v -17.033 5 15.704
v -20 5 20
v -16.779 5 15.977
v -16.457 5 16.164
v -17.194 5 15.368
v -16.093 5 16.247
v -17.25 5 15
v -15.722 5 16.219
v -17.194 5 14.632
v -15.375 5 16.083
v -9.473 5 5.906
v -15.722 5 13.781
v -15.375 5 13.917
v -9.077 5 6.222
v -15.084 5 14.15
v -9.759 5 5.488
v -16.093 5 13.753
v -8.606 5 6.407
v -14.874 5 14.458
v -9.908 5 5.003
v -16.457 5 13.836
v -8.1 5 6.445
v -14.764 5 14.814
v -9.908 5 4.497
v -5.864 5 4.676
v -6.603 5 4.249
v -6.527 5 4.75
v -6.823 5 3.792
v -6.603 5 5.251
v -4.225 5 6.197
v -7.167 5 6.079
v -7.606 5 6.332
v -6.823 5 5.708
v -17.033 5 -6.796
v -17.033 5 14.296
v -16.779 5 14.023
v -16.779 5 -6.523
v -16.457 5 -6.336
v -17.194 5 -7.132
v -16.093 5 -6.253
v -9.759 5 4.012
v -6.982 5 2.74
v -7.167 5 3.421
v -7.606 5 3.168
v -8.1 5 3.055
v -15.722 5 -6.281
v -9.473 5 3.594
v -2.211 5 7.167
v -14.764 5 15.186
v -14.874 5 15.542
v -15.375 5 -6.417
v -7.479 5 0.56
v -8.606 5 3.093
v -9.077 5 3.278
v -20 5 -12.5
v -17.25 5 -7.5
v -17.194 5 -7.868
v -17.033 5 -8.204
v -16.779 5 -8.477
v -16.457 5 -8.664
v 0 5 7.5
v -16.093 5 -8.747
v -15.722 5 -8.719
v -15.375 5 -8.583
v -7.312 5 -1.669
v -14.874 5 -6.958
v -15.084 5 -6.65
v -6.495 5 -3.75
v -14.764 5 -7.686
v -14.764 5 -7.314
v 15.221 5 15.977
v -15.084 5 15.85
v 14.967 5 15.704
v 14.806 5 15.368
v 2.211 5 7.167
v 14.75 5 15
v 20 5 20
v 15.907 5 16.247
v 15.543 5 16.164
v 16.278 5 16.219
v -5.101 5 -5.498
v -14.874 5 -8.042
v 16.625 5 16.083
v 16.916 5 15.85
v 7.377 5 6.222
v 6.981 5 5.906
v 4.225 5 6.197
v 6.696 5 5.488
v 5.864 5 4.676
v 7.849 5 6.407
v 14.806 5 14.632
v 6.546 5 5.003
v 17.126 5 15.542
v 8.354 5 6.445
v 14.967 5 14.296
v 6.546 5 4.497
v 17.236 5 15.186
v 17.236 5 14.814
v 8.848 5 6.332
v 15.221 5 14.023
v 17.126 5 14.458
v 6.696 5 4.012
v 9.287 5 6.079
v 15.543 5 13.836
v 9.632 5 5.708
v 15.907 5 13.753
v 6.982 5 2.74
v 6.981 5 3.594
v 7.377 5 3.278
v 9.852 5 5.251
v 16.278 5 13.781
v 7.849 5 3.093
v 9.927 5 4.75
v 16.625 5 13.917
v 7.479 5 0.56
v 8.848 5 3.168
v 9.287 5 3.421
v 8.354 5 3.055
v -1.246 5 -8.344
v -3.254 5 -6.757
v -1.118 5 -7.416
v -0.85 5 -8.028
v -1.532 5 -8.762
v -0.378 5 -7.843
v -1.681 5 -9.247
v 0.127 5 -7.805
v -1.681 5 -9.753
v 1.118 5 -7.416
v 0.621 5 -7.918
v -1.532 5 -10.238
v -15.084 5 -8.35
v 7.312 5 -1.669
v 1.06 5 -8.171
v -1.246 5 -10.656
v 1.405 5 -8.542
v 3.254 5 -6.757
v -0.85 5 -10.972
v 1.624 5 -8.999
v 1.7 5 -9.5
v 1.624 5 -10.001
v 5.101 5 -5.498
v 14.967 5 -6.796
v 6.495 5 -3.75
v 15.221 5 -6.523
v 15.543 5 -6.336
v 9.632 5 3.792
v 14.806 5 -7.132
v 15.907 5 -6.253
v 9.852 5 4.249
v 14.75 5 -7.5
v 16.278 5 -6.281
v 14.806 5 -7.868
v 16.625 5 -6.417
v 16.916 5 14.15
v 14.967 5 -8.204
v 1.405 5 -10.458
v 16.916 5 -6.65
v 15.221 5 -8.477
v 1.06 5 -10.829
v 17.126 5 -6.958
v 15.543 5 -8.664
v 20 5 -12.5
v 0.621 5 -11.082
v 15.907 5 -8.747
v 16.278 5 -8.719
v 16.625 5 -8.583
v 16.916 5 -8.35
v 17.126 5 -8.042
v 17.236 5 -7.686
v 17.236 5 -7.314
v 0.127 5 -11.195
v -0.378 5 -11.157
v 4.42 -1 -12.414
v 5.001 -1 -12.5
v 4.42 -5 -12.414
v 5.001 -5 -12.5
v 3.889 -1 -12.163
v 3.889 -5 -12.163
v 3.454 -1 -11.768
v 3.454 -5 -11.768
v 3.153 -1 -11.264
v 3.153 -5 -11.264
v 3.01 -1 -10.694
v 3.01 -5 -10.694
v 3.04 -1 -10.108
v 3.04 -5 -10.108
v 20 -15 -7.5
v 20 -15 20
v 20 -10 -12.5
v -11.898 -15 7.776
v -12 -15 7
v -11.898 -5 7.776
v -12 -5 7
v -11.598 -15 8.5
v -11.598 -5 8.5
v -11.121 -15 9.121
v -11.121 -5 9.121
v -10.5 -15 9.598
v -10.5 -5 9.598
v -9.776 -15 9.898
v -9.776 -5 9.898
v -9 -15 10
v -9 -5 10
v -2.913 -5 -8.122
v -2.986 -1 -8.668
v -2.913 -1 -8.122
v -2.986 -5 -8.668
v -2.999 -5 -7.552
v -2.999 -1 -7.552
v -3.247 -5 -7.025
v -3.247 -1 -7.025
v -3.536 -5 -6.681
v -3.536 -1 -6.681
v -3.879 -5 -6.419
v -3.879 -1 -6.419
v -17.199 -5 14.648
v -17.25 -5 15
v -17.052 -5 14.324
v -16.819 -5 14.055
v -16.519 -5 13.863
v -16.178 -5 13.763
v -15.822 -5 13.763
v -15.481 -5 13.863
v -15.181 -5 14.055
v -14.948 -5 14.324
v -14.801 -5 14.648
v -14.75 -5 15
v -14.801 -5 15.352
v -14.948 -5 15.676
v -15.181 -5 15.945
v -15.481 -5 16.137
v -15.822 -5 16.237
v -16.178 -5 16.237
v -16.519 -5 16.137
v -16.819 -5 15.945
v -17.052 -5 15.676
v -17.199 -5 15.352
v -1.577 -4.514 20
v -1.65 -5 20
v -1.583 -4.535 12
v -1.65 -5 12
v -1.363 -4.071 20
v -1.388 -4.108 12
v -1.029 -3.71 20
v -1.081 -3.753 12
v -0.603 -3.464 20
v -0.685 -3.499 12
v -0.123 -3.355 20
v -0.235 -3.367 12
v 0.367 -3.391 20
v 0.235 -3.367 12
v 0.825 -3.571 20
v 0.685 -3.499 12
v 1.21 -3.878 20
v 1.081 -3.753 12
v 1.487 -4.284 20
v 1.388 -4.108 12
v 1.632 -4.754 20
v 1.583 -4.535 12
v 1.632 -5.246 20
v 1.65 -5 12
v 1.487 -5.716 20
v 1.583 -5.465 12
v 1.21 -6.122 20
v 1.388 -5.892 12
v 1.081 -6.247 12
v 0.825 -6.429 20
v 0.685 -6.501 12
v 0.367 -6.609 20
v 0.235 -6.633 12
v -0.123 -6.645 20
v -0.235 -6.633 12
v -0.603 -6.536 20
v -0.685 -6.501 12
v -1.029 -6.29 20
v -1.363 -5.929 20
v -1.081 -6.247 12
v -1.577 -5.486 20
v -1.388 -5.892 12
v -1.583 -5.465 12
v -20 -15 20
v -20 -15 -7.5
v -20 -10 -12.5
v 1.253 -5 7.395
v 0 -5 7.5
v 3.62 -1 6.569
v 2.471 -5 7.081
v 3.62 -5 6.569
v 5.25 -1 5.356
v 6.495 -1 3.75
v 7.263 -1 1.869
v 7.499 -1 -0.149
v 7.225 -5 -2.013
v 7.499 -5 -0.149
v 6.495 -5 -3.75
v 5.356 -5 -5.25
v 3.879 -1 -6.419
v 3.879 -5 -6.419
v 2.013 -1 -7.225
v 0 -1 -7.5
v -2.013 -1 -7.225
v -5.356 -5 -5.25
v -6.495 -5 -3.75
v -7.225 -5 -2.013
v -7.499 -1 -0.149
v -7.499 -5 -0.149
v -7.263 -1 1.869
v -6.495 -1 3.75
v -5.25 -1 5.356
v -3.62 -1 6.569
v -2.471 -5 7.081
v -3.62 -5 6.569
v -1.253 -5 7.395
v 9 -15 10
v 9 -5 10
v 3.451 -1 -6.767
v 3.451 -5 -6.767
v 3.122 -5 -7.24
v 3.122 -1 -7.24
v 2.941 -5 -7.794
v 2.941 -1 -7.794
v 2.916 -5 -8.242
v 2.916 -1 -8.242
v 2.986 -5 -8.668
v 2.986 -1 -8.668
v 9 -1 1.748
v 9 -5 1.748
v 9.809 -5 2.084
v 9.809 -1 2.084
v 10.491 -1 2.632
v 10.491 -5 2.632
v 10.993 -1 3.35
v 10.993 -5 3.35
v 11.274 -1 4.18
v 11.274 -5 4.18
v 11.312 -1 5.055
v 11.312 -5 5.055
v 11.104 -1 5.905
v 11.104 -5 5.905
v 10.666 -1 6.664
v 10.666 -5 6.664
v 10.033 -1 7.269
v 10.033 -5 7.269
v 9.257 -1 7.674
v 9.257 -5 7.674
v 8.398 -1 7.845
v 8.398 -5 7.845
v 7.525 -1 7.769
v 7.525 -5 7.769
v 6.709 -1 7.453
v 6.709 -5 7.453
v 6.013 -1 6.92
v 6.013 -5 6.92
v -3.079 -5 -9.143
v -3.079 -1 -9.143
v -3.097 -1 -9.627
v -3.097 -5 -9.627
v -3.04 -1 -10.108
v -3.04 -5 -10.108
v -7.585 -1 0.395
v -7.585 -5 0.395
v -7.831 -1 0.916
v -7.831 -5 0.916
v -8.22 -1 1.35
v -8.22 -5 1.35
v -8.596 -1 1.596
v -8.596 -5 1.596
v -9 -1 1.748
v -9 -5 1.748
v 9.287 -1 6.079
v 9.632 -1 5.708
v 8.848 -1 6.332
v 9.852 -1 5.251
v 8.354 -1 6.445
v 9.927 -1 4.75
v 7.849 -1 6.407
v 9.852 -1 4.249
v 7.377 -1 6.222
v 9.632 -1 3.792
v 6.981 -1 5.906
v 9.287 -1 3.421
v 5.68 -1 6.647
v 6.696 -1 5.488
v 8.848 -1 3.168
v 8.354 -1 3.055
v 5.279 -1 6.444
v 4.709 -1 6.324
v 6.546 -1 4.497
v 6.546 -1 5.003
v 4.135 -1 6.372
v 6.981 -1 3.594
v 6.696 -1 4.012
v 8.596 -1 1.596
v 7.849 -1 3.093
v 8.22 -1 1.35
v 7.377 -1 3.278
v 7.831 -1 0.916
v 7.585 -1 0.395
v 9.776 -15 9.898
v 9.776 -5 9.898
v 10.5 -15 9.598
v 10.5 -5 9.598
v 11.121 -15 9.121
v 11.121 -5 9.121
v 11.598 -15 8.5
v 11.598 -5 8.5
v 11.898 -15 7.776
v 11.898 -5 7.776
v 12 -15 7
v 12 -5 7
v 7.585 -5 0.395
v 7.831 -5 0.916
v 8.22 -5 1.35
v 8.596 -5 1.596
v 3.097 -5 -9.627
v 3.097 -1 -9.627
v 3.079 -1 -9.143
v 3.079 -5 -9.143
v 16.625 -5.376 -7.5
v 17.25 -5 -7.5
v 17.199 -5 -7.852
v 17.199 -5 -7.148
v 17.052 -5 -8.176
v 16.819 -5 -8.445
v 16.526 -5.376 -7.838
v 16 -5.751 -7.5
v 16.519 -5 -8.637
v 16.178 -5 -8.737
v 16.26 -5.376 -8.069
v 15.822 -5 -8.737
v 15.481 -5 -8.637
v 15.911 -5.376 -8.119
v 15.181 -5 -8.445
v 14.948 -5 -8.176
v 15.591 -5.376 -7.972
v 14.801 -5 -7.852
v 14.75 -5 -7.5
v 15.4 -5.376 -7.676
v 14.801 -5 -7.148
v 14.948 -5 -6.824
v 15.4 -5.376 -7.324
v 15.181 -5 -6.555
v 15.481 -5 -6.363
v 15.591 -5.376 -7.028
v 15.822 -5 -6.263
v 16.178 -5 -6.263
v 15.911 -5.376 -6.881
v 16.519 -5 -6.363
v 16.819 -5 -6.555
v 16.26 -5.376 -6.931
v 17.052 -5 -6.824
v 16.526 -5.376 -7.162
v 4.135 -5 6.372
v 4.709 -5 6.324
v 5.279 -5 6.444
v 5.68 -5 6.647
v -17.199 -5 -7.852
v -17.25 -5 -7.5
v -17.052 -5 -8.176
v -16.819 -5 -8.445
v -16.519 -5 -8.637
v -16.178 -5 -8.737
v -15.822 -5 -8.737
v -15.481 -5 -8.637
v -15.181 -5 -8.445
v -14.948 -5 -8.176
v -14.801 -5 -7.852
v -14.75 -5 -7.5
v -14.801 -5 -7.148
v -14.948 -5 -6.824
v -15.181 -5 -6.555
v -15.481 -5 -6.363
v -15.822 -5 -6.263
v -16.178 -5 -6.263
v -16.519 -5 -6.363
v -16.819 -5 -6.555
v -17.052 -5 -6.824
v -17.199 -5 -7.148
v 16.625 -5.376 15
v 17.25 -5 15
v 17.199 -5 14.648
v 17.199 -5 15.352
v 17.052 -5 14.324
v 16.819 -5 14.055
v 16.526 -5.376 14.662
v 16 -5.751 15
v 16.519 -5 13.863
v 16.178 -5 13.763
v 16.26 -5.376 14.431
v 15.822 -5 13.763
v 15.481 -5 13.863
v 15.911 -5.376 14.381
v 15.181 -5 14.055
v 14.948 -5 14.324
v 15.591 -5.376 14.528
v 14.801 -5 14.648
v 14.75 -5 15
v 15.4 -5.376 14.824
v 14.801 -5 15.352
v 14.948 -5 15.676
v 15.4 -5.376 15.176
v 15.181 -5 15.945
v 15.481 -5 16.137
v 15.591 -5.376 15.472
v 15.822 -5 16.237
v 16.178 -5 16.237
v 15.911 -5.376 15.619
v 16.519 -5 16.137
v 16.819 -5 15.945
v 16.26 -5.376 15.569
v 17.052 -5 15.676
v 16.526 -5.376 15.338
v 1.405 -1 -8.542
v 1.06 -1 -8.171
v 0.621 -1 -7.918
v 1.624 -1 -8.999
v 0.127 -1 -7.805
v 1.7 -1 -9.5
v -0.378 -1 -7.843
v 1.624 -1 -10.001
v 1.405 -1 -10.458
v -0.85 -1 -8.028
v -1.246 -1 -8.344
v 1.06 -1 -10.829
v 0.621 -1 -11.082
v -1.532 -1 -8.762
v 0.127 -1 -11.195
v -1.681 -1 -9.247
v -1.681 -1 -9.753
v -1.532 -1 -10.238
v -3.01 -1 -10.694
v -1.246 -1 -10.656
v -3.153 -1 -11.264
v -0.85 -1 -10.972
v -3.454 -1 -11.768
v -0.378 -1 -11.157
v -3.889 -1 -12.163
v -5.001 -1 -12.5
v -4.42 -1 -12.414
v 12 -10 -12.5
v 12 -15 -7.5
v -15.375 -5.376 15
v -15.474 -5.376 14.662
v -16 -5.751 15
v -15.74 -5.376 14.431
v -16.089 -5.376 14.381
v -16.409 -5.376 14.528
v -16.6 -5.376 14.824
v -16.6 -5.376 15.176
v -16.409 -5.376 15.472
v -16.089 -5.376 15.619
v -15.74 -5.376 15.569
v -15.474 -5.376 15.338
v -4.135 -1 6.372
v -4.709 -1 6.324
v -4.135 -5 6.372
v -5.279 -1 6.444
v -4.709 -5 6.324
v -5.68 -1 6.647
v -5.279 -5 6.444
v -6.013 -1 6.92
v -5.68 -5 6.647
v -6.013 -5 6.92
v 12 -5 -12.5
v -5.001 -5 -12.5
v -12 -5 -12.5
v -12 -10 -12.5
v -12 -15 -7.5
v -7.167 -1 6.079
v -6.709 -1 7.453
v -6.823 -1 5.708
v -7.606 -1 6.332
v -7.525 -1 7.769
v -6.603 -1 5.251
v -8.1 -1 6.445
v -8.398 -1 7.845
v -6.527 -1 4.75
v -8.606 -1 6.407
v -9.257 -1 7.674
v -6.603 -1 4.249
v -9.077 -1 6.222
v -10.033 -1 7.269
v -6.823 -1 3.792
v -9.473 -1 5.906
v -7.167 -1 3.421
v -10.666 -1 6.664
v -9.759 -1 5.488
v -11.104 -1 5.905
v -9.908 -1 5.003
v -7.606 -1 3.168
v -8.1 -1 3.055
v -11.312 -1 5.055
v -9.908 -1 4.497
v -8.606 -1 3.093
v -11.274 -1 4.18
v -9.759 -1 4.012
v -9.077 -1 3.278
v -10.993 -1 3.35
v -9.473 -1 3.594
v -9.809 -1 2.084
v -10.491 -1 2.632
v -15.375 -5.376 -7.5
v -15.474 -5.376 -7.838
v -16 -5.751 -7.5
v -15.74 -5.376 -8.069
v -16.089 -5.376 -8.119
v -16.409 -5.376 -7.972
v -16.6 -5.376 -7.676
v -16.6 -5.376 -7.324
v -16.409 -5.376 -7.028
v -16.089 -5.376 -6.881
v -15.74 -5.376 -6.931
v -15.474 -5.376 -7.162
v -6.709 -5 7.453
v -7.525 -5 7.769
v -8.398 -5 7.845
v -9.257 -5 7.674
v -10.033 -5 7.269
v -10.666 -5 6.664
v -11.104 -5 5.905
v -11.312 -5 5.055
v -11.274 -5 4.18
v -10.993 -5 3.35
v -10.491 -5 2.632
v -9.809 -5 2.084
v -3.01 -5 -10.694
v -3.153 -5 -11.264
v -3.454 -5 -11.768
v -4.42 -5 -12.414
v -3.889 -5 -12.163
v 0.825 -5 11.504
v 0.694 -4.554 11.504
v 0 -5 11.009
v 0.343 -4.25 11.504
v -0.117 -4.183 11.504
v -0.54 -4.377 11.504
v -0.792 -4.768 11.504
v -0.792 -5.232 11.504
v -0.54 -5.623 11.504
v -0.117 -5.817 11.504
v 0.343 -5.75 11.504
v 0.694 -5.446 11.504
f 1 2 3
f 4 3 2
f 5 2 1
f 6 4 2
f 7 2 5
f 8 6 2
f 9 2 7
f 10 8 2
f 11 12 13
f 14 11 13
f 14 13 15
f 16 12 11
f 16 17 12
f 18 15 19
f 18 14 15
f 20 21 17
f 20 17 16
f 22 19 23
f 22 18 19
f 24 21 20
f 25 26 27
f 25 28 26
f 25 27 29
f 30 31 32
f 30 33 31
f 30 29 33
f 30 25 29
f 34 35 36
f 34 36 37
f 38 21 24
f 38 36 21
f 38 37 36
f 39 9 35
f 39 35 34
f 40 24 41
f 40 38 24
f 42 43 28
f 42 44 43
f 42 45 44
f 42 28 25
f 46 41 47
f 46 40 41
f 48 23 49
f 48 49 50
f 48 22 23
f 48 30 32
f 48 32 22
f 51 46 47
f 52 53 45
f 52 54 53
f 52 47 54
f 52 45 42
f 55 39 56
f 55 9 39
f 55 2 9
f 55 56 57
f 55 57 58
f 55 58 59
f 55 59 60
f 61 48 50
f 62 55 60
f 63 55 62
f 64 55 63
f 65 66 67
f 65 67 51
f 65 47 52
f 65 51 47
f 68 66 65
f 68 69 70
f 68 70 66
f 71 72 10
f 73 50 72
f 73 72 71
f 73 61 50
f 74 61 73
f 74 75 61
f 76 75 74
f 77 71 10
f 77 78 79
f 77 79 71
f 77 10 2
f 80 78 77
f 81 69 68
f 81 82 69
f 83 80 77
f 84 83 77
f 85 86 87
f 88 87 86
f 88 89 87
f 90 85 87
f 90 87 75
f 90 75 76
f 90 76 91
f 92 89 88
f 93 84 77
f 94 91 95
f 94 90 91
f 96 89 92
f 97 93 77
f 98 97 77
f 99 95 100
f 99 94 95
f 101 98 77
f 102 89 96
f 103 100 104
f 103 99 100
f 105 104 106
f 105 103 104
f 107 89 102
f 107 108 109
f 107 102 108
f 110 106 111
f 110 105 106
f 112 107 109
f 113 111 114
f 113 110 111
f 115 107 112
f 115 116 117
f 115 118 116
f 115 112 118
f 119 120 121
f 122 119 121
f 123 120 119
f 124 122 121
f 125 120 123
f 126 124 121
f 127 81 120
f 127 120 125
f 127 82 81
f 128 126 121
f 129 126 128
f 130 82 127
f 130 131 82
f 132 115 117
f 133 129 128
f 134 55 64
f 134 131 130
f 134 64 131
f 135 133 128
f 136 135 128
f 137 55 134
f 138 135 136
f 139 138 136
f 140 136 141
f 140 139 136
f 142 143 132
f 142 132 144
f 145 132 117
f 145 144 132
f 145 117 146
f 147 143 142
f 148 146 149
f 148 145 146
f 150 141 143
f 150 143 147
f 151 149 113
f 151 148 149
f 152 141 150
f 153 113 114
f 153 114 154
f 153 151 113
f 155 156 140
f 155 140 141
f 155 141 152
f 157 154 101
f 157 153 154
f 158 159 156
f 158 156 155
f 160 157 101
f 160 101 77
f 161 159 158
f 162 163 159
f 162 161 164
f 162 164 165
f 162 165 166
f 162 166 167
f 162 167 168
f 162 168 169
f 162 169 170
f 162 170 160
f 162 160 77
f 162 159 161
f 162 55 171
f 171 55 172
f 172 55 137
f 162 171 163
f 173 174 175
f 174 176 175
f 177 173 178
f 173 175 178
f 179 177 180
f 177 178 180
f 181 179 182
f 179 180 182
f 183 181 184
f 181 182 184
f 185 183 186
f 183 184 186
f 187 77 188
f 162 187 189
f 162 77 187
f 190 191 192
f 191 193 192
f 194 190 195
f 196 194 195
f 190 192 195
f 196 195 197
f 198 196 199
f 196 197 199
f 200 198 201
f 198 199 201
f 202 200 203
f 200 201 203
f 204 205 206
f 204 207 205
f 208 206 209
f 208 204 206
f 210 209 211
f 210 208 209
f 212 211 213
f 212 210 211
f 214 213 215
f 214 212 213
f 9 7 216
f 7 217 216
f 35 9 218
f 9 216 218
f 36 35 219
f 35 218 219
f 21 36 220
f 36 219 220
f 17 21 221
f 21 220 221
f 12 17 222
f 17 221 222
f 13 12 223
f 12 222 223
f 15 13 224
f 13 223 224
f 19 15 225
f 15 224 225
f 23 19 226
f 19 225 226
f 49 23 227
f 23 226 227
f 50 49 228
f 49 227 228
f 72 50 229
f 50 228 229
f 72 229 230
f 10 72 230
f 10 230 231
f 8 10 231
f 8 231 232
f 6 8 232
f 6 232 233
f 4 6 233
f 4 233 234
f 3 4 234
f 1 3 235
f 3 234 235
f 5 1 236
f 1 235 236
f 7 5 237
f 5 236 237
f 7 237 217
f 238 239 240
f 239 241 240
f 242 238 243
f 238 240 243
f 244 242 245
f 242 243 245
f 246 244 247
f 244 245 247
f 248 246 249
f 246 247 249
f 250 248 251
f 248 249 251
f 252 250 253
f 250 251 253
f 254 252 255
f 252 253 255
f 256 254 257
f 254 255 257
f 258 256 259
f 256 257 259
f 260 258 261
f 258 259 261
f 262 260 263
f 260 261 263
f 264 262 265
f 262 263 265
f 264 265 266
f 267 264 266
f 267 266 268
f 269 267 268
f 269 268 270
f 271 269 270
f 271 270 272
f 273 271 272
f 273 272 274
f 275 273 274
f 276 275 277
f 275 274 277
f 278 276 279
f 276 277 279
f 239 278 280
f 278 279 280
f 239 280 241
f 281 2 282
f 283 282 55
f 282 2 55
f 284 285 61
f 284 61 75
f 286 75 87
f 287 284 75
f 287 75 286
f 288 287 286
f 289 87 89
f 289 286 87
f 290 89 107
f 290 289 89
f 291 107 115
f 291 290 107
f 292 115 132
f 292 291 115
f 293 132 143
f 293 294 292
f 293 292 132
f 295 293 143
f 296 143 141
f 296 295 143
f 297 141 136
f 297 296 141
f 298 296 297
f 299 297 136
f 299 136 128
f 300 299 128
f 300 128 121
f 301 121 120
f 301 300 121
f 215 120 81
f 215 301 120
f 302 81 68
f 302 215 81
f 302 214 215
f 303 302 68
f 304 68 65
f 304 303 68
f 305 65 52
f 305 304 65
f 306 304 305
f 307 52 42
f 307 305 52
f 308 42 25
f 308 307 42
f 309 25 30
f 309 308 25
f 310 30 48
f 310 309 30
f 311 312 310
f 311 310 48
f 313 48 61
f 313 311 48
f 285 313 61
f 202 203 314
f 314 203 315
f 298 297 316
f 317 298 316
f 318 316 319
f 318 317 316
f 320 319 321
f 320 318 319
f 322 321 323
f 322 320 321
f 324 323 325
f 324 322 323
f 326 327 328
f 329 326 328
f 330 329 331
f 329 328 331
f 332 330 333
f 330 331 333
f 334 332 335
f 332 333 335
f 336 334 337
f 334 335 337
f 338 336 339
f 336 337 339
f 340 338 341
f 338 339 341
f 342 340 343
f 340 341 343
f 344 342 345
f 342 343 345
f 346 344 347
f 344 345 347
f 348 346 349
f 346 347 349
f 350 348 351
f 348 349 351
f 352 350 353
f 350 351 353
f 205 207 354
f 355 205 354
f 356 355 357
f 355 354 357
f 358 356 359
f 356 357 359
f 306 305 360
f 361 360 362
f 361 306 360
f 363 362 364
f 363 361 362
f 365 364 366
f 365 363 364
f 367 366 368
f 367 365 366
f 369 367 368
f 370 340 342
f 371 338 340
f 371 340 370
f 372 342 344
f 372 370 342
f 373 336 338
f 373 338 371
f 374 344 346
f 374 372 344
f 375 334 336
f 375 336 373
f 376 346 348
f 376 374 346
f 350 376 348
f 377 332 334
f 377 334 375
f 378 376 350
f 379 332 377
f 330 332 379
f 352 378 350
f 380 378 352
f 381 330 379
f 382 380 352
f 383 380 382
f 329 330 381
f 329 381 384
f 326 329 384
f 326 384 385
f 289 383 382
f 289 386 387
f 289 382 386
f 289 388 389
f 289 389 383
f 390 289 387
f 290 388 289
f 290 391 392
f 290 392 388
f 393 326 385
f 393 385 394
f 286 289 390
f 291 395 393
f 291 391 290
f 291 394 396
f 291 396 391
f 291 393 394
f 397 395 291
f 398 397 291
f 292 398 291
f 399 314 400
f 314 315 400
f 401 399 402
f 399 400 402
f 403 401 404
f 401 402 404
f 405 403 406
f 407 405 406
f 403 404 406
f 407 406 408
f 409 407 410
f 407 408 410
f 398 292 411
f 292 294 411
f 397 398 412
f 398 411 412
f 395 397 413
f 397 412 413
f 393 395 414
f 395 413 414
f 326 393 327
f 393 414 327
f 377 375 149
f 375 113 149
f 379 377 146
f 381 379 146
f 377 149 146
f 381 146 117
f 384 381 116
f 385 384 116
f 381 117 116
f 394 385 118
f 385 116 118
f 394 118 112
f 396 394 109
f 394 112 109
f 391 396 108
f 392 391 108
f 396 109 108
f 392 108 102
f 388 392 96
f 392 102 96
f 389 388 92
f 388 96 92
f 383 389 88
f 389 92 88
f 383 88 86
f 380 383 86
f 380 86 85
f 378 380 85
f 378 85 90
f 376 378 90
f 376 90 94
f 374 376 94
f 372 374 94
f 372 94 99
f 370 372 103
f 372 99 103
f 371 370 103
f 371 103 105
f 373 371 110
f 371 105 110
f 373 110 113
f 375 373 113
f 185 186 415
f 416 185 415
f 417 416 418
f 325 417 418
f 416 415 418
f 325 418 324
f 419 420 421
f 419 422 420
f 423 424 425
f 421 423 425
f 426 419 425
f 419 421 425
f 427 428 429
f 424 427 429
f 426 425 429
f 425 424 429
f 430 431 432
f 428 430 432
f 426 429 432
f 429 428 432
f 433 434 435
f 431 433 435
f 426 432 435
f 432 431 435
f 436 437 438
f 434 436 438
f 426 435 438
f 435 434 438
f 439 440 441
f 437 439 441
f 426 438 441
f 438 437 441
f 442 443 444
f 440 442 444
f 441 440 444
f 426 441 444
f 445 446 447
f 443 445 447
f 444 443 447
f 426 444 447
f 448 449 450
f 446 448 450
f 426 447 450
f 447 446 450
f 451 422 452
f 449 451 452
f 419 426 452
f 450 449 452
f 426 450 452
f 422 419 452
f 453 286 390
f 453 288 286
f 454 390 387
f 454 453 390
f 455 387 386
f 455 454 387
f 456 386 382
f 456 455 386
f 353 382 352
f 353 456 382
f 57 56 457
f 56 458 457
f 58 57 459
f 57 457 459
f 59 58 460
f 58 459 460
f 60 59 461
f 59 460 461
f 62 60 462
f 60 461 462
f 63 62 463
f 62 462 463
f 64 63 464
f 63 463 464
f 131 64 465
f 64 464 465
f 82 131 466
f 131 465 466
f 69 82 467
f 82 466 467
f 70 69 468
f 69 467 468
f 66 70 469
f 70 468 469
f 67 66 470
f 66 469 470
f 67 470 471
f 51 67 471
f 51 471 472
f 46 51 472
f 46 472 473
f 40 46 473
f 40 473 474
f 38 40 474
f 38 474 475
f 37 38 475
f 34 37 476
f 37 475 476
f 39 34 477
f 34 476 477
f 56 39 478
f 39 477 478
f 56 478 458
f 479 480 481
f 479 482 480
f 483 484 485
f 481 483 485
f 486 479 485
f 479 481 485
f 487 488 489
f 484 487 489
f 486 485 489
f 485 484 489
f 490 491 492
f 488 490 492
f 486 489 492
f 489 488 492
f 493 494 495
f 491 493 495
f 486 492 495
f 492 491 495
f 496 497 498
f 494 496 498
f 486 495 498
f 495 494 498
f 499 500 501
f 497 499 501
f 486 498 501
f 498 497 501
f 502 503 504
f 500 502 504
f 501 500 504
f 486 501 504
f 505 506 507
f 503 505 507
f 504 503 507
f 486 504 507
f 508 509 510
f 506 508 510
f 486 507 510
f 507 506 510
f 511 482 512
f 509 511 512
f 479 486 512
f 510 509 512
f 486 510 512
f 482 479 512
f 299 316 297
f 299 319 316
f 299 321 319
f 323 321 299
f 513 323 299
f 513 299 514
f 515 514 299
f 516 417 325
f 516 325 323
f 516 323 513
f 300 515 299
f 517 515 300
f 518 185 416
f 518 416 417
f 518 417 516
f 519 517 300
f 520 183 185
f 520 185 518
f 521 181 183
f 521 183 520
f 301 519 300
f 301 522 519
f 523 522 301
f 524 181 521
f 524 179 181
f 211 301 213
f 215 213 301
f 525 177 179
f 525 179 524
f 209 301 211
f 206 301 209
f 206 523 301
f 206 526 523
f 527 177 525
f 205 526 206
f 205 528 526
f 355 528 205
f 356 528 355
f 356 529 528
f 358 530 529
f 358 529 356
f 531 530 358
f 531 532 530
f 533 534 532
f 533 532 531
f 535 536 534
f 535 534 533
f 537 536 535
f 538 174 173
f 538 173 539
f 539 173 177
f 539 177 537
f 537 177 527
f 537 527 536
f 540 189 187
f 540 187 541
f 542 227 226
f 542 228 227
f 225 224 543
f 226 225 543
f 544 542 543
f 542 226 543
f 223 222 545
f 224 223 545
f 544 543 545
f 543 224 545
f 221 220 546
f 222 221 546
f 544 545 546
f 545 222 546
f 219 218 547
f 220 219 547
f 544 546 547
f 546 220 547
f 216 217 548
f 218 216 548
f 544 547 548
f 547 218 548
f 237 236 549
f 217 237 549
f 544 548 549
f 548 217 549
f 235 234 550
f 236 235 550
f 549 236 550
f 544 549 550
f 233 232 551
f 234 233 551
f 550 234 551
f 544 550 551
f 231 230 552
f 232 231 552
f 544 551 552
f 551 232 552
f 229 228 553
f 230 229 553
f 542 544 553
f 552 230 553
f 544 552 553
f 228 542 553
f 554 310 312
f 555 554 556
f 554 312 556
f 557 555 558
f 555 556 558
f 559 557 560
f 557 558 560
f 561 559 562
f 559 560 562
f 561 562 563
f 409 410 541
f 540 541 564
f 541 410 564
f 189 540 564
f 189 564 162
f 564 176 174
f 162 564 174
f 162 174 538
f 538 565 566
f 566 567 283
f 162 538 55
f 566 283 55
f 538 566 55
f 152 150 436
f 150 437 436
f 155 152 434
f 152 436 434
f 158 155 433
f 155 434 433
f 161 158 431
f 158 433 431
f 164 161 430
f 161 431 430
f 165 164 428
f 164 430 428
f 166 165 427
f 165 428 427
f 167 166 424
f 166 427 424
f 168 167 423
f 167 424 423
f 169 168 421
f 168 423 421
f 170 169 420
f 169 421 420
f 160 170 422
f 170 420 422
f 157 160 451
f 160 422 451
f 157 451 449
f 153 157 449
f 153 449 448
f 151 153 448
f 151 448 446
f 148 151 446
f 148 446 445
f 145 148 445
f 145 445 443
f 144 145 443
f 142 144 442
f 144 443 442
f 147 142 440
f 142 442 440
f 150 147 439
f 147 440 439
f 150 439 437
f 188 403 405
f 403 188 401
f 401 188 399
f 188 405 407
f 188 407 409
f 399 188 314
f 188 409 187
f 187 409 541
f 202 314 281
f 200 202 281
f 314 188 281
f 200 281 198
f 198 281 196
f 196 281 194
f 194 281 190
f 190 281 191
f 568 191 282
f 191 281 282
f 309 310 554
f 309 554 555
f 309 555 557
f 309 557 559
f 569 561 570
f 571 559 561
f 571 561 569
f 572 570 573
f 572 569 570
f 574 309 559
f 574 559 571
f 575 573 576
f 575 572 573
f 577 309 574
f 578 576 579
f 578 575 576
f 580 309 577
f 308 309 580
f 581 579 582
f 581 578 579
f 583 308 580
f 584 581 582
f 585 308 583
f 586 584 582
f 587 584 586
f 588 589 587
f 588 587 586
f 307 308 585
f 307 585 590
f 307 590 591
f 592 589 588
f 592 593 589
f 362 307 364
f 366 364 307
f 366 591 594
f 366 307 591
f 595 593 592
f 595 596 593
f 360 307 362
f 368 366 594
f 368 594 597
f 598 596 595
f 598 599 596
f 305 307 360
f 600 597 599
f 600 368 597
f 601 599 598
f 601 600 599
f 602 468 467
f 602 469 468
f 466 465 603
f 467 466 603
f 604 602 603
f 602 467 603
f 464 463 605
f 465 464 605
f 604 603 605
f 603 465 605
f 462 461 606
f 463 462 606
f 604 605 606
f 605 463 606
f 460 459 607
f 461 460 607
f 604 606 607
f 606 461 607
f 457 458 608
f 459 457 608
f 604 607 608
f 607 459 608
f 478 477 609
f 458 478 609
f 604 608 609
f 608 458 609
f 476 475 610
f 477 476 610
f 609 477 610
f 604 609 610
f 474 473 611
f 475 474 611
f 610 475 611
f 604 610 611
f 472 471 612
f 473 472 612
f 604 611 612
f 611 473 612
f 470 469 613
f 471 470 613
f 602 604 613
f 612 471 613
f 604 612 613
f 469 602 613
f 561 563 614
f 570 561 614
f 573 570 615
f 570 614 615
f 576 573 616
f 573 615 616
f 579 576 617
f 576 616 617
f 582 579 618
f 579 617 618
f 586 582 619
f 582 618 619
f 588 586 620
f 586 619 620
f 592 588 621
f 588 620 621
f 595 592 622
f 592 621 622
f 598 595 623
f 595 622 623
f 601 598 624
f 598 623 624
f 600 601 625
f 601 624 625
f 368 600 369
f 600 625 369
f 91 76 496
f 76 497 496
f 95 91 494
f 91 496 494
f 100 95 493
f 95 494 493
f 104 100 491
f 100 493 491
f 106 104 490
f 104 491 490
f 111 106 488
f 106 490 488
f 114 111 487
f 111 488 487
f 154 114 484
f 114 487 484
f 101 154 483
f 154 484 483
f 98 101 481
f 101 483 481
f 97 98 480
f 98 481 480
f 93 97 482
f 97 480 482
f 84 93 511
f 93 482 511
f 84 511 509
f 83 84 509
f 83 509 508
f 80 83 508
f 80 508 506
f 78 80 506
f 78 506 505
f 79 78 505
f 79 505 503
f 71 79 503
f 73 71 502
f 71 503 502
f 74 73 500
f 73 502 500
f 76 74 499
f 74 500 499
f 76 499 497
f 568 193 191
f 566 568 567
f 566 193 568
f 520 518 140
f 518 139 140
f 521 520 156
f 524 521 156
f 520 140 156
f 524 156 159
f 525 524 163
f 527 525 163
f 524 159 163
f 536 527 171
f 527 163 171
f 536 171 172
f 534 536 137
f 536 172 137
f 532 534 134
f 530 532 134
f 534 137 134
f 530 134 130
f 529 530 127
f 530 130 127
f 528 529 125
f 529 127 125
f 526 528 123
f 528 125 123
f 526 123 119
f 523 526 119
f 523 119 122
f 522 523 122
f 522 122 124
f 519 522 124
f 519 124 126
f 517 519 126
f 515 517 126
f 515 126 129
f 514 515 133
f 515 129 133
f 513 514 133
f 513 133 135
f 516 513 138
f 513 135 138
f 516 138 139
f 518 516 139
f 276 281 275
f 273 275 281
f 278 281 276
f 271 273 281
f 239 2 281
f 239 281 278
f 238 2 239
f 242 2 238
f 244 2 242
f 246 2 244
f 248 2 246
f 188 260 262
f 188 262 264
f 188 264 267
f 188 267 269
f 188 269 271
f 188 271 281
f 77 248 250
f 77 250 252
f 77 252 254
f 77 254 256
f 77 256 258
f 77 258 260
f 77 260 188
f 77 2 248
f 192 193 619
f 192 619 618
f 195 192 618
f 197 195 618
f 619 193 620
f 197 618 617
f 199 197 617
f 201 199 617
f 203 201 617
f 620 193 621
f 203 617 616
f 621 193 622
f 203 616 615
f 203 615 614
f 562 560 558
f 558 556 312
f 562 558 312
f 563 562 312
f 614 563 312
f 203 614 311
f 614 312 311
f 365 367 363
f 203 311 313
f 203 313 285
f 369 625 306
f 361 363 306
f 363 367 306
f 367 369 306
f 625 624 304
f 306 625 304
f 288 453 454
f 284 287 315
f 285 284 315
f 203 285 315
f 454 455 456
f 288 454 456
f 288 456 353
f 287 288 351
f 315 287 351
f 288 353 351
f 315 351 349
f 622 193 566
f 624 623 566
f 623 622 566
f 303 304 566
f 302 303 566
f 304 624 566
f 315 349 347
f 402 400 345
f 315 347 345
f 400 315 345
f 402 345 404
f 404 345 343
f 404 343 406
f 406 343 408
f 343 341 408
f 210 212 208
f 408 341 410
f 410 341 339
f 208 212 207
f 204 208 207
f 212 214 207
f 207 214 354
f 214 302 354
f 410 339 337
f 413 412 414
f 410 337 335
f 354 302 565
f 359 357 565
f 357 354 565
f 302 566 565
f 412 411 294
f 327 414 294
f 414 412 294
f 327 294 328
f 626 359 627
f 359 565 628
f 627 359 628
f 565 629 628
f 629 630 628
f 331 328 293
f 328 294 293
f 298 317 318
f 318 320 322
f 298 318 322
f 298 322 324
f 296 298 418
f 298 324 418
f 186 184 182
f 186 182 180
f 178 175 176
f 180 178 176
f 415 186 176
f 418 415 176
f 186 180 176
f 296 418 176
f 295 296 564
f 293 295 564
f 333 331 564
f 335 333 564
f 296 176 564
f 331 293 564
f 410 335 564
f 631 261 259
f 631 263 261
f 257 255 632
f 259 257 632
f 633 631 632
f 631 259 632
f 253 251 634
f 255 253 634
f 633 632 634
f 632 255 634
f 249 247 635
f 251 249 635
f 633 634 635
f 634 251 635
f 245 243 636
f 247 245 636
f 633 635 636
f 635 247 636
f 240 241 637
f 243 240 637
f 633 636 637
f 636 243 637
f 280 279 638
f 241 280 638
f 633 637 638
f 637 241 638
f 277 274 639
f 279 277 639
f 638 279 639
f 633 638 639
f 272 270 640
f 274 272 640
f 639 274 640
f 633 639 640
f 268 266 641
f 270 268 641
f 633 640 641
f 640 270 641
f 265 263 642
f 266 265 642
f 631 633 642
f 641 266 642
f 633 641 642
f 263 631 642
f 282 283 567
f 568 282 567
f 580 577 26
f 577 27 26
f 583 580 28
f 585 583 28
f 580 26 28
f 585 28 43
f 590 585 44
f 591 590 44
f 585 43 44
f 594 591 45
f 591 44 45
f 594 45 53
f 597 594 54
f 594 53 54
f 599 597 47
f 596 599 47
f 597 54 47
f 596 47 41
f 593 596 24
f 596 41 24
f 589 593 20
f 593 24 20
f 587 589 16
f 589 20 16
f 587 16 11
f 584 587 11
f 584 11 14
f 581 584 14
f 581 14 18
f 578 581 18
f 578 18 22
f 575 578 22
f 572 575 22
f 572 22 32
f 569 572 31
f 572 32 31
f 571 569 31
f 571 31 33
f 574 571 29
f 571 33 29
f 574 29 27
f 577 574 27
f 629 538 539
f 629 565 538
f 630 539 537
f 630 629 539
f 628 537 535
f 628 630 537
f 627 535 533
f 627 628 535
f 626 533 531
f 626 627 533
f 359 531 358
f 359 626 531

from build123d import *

# Parameters (mm, degrees)
SKETCH3_W                                            = 40
SKETCH3_H                                            = 25
BOSS_EXTRUDE2_DEPTH                                  = 5
CUT_EXTRUDE2_DEPTH                                   = 26.617376915
CUT_EXTRUDE2_DEPTH_BACK                              = 26.617376915
SKETCH4_R                                            = 7.5
SKETCH5_W                                            = 40
SKETCH5_H                                            = 10
BOSS_EXTRUDE3_DEPTH                                  = 20
CBORE_FOR_M3_HEXAGON_SOCKET_HEAD_CAP_SCR_D           = 3.4
CBORE_FOR_M3_HEXAGON_SOCKET_HEAD_CAP_SCR_CBORE_D     = 6.2
CBORE_FOR_M3_HEXAGON_SOCKET_HEAD_CAP_SCR_CBORE_DEPTH = 4
FILLET1_R                                            = 2
SKETCH9_W                                            = 22.5
SKETCH9_H                                            = 10
BOSS_EXTRUDE4_DEPTH                                  = 8
CHAMFER1_SIZE                                        = 5
M3_TAPPED_HOLE1_D                                    = 2.5
M3_TAPPED_HOLE1_DEPTH                                = 10
M3_TAPPED_HOLE1_TIP                                  = 0.751075774
FILLET2_R                                            = 3
M4_TAPPED_HOLE1_D                                    = 3.3
M4_TAPPED_HOLE1_DEPTH                                = 8
M4_TAPPED_HOLE1_TIP                                  = 0.991420021


with BuildPart() as part:
    # Sketch3 → Boss-Extrude2 (new, symmetric)
    with BuildSketch(Plane(origin=(0, 0, 0), x_dir=(1, 0, 0), z_dir=(0, 1, 0))):
        Rectangle(SKETCH3_W, SKETCH3_H)
    extrude(amount=BOSS_EXTRUDE2_DEPTH, both=True)

    # Sketch4 → Cut-Extrude2 (cut, two sides: drawn at the far end of the back side and taken through both)
    with BuildSketch(Plane(origin=(0, 5, 0), x_dir=(1, 0, 0), z_dir=(0, 1, 0)).offset(-CUT_EXTRUDE2_DEPTH_BACK)):
        with Locations(Location((0, 0, 0), (0, 0, 270))):
            Circle(SKETCH4_R)
    extrude(amount=CUT_EXTRUDE2_DEPTH + CUT_EXTRUDE2_DEPTH_BACK, mode=Mode.SUBTRACT)

    # Sketch5 → Boss-Extrude3 (add)
    with BuildSketch(Plane.XZ.offset(-5)):
        with Locations((0, 15)):
            Rectangle(SKETCH5_W, SKETCH5_H)
    extrude(amount=BOSS_EXTRUDE3_DEPTH)

    # CBORE for M3 Hexagon socket head cap screws1 (through all)
    with Locations(Plane(origin=(0, -5, 0), x_dir=(-1, 0, 0), z_dir=(0, -1, 0))):
        with Locations((0, 9.5), (8.227241336, -4.75), (-8.227241336, -4.75)):
            CounterBoreHole(CBORE_FOR_M3_HEXAGON_SOCKET_HEAD_CAP_SCR_D / 2, CBORE_FOR_M3_HEXAGON_SOCKET_HEAD_CAP_SCR_CBORE_D / 2, CBORE_FOR_M3_HEXAGON_SOCKET_HEAD_CAP_SCR_CBORE_DEPTH)

    # Fillet1
    fillet1_edges = [part.edges().sort_by_distance(p)[0] for p in [
        (5.197639771, -3, 5.406897522),
        (7.281330495, -3, 1.79783932),
        (-7.281330495, -3, 1.79783932),
        (-5.197639771, -3, 5.406897522),
        (2.083690725, -3, -7.204736842),
        (-2.083690725, -3, -7.204736842),
        (-0.781024968, -3, -12.5),
        (0.781024968, -3, -12.5),
    ]]
    fillet(fillet1_edges, radius=FILLET1_R)

    # Sketch9 → Boss-Extrude4 (add)
    with BuildSketch(Plane(origin=(20, 0, 0), x_dir=(0, 0, -1), z_dir=(1, 0, 0))):
        with Locations((1.25, -10)):
            Rectangle(SKETCH9_W, SKETCH9_H)
    boss_extrude4 = extrude(amount=-BOSS_EXTRUDE4_DEPTH)

    # Mirror1: Boss-Extrude4 across plane
    add(boss_extrude4.mirror(Plane(origin=(0, 0, 0), x_dir=(0, 0, 1), z_dir=(1, 0, 0))))

    # Chamfer1
    chamfer1_edges = [part.edges().sort_by_distance(p)[0] for p in [
        (16, -15, -12.5),
        (-16, -15, -12.5),
    ]]
    chamfer(chamfer1_edges, length=CHAMFER1_SIZE)

    # M3 Tapped Hole1
    with Locations(Plane(origin=(0, 5, 0), x_dir=(1, 0, 0), z_dir=(0, 1, 0))):
        with Locations((-16, 7.5), (-16, -15), (16, -15), (16, 7.5)):
            Hole(M3_TAPPED_HOLE1_D / 2, depth=M3_TAPPED_HOLE1_DEPTH)
            with Locations((0, 0, -(M3_TAPPED_HOLE1_DEPTH + M3_TAPPED_HOLE1_TIP / 2))):  # 118° drill point
                Cone(0, M3_TAPPED_HOLE1_D / 2, M3_TAPPED_HOLE1_TIP, mode=Mode.SUBTRACT)

    # Fillet2
    fillet2_edges = [part.edges().sort_by_distance(p)[0] for p in [
        (12, -10, 10),
        (-12, -10, 10),
    ]]
    fillet(fillet2_edges, radius=FILLET2_R)

    # M4 Tapped Hole1
    with Locations(Plane.XY.offset(20)):
        with Locations((0, -5)):
            Hole(M4_TAPPED_HOLE1_D / 2, depth=M4_TAPPED_HOLE1_DEPTH)
            with Locations((0, 0, -(M4_TAPPED_HOLE1_DEPTH + M4_TAPPED_HOLE1_TIP / 2))):  # 118° drill point
                Cone(0, M4_TAPPED_HOLE1_D / 2, M4_TAPPED_HOLE1_TIP, mode=Mode.SUBTRACT)


solid = part.part
